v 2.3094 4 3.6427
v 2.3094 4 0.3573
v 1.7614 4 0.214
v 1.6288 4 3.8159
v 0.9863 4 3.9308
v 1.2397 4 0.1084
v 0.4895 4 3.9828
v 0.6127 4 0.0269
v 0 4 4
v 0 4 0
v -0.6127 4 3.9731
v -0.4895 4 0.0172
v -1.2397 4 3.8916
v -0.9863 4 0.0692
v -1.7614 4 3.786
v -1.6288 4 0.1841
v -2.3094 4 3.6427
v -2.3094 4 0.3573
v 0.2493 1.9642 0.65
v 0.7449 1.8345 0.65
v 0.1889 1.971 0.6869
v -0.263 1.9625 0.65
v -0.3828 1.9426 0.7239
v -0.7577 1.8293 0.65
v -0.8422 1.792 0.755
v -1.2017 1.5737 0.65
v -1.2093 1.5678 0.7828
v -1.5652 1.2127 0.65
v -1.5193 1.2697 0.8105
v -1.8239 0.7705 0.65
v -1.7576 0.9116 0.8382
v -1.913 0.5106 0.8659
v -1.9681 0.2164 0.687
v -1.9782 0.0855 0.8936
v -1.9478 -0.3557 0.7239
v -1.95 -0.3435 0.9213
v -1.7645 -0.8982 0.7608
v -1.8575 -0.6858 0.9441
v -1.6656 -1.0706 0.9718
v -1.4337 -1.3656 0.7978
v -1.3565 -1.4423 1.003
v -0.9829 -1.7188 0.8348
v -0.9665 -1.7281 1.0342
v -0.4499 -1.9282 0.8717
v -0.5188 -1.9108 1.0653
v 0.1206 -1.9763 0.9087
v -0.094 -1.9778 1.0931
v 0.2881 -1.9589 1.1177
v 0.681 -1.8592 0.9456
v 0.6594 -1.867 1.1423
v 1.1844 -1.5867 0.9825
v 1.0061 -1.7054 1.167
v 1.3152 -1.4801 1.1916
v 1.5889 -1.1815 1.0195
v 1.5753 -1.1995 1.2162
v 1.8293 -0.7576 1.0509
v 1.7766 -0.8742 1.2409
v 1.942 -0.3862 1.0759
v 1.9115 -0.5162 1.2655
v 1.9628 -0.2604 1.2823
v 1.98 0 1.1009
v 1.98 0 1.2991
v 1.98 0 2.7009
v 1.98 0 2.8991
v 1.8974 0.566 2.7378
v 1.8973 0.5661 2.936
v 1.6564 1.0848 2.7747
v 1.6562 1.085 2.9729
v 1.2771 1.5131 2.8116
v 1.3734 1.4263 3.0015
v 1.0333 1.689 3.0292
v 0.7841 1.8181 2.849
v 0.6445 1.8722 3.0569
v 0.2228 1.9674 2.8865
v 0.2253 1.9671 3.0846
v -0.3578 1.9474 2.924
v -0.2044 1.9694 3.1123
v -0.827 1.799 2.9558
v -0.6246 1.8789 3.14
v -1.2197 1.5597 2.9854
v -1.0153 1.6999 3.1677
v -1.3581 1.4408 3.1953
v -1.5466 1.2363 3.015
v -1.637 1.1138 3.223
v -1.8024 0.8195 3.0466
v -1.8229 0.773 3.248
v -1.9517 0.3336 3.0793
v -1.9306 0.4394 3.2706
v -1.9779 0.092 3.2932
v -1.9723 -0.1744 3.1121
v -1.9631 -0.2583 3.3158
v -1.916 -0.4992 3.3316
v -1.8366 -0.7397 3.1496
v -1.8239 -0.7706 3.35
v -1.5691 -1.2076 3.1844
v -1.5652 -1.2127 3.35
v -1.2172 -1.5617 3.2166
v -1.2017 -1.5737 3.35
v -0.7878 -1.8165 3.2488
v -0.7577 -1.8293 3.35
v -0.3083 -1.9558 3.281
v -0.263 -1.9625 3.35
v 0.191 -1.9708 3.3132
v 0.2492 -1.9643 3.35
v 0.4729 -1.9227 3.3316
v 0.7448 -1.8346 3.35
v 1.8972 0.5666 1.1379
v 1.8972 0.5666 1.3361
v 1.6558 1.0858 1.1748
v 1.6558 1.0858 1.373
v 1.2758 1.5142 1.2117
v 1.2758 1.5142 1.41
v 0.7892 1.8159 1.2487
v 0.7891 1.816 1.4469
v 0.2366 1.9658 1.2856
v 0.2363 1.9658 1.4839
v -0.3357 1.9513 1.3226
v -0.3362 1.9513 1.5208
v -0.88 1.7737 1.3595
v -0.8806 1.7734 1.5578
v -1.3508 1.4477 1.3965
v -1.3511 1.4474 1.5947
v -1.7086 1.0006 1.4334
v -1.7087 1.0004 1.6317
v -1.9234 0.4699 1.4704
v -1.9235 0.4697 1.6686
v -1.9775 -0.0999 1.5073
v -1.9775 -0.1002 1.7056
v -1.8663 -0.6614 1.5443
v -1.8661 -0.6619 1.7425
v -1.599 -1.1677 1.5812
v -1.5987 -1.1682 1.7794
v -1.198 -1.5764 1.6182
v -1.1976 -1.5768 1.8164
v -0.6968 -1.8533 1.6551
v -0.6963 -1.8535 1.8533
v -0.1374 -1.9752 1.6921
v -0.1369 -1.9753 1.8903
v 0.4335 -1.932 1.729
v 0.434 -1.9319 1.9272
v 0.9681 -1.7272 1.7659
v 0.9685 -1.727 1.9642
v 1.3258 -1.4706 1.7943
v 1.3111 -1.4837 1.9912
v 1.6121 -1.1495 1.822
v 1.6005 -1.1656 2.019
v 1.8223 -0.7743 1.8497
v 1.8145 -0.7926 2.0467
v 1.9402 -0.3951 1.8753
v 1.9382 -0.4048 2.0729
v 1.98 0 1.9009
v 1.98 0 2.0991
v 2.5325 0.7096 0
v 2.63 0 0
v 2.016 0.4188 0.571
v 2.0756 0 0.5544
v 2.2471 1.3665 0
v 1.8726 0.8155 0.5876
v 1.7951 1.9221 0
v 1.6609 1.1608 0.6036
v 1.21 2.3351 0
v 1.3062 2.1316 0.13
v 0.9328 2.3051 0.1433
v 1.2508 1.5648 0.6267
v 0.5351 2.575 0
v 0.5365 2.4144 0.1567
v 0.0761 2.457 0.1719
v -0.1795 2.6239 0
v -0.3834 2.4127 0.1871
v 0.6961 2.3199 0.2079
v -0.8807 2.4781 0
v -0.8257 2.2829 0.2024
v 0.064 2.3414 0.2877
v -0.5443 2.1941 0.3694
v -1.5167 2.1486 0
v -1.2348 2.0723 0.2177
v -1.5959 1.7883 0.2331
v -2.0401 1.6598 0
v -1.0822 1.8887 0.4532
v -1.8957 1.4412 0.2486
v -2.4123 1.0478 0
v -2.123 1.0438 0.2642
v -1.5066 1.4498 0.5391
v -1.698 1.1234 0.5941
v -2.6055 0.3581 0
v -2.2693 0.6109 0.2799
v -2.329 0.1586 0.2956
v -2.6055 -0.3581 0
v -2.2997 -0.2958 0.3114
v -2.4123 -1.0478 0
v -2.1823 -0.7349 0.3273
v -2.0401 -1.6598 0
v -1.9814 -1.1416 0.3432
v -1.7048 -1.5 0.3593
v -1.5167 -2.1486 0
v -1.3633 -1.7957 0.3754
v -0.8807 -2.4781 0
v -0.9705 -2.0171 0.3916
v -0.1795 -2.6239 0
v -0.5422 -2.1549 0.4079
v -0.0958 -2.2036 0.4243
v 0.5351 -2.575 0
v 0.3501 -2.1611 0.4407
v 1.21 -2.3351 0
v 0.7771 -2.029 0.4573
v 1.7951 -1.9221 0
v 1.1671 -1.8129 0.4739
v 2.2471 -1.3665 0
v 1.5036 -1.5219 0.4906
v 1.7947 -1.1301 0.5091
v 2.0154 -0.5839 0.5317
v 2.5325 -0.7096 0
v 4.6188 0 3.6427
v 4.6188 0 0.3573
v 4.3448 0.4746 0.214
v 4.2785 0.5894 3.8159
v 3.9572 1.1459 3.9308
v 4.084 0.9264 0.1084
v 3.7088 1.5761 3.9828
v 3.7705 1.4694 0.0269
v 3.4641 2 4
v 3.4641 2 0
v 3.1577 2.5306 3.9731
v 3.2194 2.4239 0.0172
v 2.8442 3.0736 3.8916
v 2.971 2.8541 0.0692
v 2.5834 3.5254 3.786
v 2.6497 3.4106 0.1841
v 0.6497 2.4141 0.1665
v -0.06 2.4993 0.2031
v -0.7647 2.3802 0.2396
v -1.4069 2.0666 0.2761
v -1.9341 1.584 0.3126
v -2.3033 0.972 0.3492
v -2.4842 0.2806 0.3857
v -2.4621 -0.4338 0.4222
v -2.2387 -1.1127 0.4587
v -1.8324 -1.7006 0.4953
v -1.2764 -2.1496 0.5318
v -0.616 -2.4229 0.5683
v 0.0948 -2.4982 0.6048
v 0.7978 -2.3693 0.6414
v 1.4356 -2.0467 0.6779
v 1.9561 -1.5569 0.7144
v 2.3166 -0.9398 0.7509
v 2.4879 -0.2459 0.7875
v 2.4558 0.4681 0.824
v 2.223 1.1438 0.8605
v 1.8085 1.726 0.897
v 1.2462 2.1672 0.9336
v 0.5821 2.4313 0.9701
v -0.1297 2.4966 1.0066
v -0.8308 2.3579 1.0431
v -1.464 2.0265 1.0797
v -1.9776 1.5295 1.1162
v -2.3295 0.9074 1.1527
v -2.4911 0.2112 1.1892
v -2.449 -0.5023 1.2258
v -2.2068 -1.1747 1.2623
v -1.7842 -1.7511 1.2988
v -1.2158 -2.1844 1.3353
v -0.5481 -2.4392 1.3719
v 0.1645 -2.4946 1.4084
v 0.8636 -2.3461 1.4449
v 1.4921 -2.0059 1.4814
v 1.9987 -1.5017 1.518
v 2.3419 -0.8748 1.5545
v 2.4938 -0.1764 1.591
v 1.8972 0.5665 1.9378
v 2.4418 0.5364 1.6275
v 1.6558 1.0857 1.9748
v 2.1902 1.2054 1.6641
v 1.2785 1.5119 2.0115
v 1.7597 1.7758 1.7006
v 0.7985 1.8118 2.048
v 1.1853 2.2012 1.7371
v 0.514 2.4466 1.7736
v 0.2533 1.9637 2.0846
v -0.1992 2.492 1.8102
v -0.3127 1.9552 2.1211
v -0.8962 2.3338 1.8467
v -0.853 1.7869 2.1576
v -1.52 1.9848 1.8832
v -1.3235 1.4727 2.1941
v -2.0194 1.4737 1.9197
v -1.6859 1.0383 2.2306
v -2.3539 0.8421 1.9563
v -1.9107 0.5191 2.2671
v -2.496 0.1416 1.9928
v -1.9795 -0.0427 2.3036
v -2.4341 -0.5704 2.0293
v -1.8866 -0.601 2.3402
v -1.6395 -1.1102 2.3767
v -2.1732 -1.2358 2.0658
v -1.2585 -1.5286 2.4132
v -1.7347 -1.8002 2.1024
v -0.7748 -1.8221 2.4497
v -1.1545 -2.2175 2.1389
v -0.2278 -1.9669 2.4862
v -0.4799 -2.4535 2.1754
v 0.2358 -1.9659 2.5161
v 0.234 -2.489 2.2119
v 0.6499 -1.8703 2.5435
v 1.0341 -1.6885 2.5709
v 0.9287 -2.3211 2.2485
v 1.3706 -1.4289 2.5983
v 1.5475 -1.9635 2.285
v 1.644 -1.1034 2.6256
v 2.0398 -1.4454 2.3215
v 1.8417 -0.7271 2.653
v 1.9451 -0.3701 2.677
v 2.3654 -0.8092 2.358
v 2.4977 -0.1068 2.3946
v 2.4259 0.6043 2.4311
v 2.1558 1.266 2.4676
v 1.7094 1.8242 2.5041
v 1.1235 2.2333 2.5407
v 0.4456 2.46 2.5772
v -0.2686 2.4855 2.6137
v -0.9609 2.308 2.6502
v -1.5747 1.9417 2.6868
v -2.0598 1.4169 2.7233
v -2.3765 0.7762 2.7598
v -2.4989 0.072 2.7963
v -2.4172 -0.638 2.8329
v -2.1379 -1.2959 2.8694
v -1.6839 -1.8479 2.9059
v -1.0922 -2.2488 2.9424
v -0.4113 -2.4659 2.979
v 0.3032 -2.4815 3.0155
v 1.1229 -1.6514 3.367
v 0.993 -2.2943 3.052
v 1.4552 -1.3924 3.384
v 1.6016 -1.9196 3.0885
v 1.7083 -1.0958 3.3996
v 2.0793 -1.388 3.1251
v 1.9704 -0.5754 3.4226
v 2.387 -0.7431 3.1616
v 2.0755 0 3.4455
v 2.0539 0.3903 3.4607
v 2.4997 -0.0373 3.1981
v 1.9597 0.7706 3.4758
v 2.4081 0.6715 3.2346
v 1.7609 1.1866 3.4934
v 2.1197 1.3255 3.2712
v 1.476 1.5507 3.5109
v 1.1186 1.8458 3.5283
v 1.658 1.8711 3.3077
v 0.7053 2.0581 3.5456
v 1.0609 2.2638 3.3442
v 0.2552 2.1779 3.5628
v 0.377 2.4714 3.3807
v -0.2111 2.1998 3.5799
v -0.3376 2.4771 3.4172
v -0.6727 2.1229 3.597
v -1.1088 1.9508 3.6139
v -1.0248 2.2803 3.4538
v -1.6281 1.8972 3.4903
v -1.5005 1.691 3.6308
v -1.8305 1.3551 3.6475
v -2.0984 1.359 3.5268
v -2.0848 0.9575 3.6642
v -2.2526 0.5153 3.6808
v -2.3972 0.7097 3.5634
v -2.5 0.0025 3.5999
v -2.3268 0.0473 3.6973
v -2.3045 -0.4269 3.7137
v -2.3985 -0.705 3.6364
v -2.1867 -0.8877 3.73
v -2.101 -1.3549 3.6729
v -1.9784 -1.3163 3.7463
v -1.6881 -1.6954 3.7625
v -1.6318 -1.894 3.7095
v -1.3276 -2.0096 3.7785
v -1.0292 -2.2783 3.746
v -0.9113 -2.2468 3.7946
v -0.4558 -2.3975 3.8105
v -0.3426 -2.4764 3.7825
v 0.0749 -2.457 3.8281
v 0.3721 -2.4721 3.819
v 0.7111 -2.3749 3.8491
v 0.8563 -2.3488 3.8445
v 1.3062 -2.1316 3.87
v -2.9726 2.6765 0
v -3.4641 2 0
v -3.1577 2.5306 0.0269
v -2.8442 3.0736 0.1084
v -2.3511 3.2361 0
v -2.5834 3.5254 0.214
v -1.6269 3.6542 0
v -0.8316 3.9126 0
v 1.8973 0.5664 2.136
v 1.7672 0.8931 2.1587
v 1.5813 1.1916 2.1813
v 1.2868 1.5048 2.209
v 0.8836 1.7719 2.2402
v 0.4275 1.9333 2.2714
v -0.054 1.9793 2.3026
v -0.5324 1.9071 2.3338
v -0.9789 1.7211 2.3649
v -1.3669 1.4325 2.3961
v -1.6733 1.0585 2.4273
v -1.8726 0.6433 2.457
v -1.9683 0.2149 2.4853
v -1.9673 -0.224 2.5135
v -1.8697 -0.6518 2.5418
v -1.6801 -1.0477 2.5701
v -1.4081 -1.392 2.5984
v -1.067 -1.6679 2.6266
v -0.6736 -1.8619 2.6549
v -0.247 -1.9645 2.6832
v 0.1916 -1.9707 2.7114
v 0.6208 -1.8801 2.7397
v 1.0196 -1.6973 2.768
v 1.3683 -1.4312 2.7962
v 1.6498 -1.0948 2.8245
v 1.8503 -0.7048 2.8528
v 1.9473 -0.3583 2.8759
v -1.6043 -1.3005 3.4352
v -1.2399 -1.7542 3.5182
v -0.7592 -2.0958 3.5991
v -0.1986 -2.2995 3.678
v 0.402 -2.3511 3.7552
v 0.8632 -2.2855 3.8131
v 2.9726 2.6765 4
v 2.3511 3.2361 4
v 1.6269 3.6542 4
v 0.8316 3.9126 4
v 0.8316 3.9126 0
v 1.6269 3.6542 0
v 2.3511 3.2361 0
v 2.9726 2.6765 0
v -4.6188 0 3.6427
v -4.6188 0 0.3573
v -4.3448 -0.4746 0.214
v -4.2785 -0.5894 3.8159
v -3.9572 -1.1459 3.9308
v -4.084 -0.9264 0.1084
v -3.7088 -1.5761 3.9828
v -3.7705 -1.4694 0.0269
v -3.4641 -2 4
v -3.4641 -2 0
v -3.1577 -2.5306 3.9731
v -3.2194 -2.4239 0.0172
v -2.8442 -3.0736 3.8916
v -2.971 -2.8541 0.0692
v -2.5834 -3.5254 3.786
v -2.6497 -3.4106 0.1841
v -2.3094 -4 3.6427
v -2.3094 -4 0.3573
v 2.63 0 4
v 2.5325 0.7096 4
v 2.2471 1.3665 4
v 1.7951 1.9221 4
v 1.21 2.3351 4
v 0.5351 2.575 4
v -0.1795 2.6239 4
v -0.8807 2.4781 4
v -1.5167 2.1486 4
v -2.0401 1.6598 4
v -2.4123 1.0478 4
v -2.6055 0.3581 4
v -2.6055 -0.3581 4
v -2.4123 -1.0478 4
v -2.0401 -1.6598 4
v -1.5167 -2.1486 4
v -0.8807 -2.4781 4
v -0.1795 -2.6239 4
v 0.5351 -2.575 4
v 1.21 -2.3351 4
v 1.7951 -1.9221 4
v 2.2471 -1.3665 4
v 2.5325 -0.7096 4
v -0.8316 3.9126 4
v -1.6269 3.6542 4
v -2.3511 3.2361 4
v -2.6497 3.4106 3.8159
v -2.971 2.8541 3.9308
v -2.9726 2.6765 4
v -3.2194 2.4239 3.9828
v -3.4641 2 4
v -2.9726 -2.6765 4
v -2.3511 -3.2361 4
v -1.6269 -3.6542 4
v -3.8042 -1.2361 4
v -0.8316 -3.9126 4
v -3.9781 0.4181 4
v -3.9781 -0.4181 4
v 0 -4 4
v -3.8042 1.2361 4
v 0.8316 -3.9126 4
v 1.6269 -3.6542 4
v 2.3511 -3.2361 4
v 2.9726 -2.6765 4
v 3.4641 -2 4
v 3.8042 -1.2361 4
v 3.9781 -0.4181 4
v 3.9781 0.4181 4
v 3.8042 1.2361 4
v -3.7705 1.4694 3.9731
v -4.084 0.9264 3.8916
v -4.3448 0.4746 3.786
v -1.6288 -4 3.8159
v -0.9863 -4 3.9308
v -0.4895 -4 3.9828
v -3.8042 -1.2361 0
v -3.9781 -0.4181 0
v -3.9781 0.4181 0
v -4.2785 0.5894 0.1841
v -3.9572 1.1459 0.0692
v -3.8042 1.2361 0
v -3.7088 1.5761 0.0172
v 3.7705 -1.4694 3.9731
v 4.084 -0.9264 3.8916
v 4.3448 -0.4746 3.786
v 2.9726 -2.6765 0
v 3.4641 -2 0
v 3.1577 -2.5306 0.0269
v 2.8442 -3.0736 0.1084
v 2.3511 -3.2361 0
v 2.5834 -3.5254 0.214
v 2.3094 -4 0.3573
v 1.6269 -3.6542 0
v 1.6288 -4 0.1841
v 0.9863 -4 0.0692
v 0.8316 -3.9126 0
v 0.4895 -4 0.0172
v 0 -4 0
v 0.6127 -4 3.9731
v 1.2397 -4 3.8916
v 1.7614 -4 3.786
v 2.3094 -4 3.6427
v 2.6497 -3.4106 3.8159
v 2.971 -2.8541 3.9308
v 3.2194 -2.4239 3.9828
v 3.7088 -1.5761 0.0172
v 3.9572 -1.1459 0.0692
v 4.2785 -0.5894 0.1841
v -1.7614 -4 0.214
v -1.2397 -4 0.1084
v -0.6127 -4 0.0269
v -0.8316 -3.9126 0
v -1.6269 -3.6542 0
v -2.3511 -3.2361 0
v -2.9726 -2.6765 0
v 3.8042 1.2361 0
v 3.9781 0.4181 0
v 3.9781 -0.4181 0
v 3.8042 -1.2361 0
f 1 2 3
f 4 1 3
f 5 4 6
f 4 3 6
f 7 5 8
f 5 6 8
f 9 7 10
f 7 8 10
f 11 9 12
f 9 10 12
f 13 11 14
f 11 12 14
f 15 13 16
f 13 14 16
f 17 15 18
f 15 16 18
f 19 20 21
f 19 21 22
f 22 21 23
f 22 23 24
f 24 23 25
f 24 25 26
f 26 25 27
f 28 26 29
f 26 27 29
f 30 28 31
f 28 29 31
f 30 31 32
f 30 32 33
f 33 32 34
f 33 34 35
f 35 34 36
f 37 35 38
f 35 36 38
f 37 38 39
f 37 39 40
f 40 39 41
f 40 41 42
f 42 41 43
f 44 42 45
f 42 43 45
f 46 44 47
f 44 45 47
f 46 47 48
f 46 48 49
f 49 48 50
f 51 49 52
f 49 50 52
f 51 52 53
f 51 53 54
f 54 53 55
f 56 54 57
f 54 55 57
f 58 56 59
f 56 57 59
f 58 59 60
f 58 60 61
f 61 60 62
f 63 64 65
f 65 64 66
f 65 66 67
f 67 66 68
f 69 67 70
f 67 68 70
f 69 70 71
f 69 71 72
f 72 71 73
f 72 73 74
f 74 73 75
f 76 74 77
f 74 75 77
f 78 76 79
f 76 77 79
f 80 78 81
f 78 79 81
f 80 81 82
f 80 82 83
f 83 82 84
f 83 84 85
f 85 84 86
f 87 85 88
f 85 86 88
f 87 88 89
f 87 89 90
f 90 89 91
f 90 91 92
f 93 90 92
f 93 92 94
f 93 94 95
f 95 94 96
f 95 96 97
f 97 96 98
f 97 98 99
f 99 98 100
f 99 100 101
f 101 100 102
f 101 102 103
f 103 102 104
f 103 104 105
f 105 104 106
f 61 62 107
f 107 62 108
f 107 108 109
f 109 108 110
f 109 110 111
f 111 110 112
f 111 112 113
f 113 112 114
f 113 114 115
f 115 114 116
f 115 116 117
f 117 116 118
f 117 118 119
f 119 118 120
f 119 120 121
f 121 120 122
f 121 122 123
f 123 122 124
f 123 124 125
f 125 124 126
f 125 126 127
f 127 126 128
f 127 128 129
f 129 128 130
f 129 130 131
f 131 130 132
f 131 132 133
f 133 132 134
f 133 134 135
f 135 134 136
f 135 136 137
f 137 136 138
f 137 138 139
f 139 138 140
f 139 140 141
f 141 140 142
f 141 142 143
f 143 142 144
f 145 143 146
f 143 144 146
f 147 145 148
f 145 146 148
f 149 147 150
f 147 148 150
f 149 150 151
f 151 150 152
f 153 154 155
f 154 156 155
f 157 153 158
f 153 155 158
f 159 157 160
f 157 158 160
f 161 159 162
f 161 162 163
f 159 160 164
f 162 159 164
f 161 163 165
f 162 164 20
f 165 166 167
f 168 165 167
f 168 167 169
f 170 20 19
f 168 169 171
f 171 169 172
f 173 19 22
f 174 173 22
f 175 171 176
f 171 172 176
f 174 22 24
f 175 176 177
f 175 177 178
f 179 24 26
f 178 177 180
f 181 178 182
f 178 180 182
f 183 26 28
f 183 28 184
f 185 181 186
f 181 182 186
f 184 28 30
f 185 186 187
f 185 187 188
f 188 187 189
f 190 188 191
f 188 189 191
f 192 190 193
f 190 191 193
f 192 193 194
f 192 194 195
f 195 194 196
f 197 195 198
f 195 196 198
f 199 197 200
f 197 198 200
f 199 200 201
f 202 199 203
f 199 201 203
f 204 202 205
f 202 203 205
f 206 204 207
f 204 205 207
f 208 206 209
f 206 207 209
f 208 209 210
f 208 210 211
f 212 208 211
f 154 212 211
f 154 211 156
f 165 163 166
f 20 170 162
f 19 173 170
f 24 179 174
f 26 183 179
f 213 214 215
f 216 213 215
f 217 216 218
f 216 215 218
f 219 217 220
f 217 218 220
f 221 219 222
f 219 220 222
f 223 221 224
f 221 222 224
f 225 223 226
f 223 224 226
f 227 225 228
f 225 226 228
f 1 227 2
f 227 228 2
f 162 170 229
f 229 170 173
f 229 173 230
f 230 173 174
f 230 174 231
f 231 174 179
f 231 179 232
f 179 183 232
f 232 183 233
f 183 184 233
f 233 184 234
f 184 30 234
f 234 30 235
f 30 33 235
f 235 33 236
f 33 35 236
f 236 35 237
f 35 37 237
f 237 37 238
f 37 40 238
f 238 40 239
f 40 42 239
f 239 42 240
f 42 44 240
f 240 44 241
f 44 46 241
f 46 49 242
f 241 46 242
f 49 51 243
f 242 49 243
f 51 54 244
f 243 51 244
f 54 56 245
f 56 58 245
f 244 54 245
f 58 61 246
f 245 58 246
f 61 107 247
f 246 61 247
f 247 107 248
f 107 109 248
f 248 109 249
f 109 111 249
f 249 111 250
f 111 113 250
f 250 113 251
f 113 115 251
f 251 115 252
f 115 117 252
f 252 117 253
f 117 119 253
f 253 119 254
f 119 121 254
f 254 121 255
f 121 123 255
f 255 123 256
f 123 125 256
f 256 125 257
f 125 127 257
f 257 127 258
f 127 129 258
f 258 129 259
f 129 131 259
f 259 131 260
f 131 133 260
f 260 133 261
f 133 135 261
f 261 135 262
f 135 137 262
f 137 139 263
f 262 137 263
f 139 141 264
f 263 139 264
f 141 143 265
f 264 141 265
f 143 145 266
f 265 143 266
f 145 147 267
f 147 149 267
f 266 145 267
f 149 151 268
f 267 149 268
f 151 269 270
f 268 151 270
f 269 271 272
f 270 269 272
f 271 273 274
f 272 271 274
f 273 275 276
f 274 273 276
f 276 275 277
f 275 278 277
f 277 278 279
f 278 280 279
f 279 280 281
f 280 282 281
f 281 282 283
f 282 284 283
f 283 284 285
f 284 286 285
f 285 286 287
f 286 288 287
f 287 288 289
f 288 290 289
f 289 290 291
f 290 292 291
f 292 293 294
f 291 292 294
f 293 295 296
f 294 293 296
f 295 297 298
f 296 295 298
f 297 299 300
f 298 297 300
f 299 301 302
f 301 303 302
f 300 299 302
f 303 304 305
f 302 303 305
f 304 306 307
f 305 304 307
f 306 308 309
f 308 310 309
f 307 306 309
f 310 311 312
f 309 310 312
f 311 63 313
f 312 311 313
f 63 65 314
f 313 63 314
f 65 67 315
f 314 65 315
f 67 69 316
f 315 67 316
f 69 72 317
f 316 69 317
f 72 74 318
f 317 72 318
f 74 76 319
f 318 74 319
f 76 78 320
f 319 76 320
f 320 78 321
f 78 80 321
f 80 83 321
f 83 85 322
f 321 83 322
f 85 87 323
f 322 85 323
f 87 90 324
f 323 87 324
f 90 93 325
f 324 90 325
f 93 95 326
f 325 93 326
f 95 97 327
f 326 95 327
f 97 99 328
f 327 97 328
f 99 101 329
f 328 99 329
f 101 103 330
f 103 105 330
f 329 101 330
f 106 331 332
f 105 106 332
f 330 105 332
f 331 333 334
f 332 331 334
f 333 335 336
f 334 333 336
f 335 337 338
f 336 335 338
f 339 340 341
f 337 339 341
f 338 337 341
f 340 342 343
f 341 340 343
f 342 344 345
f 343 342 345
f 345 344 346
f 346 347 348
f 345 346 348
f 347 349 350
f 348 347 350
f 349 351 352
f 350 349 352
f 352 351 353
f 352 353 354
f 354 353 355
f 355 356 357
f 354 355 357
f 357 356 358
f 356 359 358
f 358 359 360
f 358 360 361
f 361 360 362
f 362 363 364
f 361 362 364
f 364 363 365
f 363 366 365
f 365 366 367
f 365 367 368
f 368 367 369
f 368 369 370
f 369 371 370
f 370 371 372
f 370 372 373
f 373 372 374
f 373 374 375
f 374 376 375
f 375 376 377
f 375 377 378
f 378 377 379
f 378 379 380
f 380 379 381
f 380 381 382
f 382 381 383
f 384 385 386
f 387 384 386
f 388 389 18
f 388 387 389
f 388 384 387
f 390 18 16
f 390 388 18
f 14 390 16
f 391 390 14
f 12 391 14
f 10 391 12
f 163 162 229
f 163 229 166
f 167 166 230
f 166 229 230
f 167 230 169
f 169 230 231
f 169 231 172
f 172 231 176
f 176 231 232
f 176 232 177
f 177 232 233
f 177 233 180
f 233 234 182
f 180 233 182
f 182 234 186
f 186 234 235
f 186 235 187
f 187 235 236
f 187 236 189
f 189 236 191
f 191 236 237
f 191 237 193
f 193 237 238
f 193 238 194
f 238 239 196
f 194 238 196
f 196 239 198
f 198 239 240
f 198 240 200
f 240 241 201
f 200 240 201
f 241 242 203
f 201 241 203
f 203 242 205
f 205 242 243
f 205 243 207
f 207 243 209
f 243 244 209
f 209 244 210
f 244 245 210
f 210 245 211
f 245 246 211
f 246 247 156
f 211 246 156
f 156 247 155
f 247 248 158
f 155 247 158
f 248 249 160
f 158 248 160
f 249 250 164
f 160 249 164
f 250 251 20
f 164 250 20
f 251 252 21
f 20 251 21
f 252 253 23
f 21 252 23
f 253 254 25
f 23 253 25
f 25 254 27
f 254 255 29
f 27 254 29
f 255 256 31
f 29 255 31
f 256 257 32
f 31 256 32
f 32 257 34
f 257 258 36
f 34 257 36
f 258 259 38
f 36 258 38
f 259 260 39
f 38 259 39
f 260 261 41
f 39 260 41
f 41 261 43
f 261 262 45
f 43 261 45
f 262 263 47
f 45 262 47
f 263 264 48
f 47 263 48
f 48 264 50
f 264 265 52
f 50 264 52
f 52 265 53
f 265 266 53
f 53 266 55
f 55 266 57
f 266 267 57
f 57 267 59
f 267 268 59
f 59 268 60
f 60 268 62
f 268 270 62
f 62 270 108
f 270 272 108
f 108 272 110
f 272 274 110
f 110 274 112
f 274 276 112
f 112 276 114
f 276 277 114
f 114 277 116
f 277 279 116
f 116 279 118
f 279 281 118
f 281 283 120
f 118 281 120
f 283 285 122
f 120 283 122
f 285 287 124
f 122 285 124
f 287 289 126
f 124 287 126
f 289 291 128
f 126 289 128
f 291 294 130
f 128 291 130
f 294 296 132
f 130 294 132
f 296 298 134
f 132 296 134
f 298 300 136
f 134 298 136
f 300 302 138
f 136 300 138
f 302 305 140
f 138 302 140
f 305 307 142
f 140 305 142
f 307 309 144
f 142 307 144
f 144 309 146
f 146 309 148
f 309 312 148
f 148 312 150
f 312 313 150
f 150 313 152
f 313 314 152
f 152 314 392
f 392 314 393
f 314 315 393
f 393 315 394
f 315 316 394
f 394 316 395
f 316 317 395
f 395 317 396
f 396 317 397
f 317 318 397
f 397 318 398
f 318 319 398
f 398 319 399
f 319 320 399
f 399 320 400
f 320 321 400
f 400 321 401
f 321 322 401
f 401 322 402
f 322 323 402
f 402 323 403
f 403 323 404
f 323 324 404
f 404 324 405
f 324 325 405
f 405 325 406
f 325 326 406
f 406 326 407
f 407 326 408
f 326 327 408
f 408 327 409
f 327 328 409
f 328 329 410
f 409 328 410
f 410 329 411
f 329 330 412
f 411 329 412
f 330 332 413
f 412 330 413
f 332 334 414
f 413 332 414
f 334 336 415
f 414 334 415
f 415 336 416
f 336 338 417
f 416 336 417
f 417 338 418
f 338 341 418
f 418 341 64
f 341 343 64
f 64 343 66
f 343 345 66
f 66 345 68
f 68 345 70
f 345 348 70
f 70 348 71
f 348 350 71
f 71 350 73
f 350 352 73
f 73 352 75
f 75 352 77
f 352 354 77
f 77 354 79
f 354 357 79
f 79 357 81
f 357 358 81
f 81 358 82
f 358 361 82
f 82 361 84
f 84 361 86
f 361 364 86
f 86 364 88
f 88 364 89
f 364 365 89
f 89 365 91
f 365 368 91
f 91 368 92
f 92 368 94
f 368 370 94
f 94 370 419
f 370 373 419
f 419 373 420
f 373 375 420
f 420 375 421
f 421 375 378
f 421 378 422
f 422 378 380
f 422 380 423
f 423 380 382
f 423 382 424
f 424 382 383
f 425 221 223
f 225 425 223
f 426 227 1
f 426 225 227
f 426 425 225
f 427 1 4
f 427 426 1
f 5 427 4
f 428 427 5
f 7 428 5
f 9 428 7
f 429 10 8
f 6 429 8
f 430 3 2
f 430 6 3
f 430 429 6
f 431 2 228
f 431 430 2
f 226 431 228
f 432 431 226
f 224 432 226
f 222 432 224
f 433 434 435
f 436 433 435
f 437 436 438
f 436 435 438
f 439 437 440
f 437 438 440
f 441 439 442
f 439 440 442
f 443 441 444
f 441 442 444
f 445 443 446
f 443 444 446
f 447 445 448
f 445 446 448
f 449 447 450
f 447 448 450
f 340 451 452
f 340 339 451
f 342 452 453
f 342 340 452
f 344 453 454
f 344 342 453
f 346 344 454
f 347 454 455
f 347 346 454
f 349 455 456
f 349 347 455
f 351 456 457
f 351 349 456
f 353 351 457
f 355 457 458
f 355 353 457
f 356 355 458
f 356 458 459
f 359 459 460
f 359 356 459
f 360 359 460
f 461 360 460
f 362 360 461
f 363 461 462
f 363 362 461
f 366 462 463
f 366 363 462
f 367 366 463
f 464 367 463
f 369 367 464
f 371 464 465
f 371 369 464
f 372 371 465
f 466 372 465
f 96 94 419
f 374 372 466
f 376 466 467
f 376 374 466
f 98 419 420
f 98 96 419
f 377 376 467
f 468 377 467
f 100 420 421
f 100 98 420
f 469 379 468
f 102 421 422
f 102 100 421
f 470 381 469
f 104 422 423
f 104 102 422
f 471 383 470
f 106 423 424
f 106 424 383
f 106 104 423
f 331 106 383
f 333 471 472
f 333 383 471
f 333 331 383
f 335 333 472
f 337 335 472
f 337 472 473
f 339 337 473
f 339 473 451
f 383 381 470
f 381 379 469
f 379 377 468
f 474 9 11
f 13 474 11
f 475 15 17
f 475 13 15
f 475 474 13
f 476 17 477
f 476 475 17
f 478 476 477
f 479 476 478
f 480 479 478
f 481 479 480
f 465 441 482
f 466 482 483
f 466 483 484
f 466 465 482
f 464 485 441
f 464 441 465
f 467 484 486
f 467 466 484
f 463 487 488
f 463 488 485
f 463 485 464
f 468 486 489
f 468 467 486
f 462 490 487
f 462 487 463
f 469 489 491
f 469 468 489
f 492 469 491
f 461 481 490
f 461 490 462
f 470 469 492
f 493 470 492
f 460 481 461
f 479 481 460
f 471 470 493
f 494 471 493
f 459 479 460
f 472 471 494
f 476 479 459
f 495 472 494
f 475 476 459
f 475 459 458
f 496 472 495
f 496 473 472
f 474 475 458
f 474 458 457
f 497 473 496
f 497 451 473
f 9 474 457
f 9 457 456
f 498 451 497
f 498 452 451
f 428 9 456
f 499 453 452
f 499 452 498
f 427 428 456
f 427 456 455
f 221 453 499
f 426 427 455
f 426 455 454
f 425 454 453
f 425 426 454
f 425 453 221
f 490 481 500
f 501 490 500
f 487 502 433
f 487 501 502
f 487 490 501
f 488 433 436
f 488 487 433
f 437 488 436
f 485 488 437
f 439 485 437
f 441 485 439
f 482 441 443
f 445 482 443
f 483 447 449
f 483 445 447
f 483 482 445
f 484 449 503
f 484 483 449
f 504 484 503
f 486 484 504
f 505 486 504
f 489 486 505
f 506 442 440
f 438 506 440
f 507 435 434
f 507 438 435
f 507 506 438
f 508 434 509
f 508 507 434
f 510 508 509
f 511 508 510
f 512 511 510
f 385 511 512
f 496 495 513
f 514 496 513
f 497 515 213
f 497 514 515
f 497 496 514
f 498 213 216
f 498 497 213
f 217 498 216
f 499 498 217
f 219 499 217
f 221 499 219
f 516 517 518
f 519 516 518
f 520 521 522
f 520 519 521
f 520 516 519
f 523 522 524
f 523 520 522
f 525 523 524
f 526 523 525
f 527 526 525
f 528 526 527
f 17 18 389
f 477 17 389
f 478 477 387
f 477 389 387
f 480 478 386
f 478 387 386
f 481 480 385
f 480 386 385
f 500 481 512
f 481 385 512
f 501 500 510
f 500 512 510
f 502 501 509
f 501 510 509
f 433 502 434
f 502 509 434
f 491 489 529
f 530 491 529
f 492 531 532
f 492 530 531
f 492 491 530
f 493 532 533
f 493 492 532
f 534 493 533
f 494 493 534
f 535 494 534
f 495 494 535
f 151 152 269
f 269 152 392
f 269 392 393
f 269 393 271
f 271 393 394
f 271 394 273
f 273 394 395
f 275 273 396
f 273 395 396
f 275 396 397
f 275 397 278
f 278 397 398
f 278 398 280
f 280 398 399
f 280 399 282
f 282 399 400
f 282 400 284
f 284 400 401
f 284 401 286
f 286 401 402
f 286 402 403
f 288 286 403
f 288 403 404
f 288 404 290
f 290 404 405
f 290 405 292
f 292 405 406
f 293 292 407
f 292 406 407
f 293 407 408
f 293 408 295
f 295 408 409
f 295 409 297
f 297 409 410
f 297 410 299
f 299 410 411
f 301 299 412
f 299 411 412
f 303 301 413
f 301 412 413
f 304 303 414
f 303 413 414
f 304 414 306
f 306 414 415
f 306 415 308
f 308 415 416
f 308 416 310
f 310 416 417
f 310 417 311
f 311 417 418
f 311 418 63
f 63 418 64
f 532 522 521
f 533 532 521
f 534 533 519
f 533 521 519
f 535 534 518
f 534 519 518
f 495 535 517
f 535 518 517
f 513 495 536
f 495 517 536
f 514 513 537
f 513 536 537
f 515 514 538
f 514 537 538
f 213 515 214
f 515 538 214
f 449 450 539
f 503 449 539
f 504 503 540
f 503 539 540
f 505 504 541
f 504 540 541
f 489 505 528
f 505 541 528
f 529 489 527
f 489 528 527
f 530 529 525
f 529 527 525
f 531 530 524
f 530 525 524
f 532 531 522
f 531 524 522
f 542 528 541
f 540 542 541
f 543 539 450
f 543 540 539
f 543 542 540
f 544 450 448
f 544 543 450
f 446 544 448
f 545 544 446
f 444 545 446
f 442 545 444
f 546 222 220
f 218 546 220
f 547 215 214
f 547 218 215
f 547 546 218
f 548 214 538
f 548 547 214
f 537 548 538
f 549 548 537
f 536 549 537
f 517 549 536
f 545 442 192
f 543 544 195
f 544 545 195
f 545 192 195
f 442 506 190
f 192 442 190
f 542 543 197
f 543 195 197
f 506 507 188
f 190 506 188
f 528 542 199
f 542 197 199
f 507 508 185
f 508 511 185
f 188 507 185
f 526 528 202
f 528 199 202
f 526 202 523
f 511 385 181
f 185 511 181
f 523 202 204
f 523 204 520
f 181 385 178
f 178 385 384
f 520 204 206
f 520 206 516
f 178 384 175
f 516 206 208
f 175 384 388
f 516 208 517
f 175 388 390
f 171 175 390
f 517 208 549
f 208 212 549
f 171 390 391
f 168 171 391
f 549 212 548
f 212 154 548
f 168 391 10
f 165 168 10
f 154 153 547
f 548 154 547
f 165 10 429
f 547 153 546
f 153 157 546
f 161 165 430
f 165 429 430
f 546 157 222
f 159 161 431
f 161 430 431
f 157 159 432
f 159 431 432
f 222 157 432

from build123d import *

# Parameters (mm, degrees)
Y_KSEKLIK_EKSTR_ZYON1_DEPTH = 4
IZIM2_OUTSIDE_W             = 27.666
IZIM2_OUTSIDE_H             = 26.428
IZIM2_OUTSIDE_R             = 4
KES_EKSTR_ZYON1_DEPTH       = 4
KES_EKSTR_ZYON1_DRAFT       = -60
IZIM3_OUTSIDE_W             = 27.666
IZIM3_OUTSIDE_H             = 26.428
IZIM3_OUTSIDE_R             = 4
KES_EKSTR_ZYON2_DEPTH       = 4
KES_EKSTR_ZYON2_DRAFT       = -60
IZIM4_R                     = 1.98
KES_EKSTR_ZYON3_DEPTH       = 4
PAH1_SIZE                   = 0.65
KES_S_P_R1_PITCH            = 0.8
KES_S_P_R1_HEIGHT           = 5
KES_S_P_R1_RADIUS           = 1.98


with BuildPart() as part:
    # Çizim1 → Yükseklik-Ekstrüzyon1 (new body)
    with BuildSketch(Plane.XY):
        Polygon((4.618802154, 0), (2.309401077, 4), (-2.309401077, 4), (-4.618802154, 0), (-2.309401077, -4), (2.309401077, -4), align=None)
    extrude(amount=Y_KSEKLIK_EKSTR_ZYON1_DEPTH)


with BuildPart() as kes_ekstr_zyon1_tool:
    # Çizim2 outside → Kes-Ekstrüzyon1 (with draft: the straight prism first)
    with BuildSketch(Plane.XY.offset(4)):
        Rectangle(IZIM2_OUTSIDE_W, IZIM2_OUTSIDE_H)
        Circle(IZIM2_OUTSIDE_R, mode=Mode.SUBTRACT)
    extrude(amount=-KES_EKSTR_ZYON1_DEPTH)
    # Kes-Ekstrüzyon1: the draft: its side faces are tilted about the plane it starts from
    kes_ekstr_zyon1_sides = [kes_ekstr_zyon1_tool.faces().sort_by_distance(p)[0] for p in [
        (0, -13.214, 2),
        (13.833, 0, 2),
        (0, 13.214, 2),
        (-13.833, 0, 2),
        (-4, 0, 2),
    ]]
    draft(kes_ekstr_zyon1_sides, Plane.XY.offset(4), KES_EKSTR_ZYON1_DRAFT)


with BuildPart() as part_1:
    add(part.part)

    # Kes-Ekstrüzyon1: cut by kes_ekstr_zyon1_tool
    add(kes_ekstr_zyon1_tool.part, mode=Mode.SUBTRACT)


with BuildPart() as kes_ekstr_zyon2_tool:
    # Çizim3 outside → Kes-Ekstrüzyon2 (with draft: the straight prism first)
    with BuildSketch(Plane(origin=(0, 0, 0), x_dir=(-1, 0, 0), z_dir=(0, 0, -1))):
        Rectangle(IZIM3_OUTSIDE_W, IZIM3_OUTSIDE_H)
        Circle(IZIM3_OUTSIDE_R, mode=Mode.SUBTRACT)
    extrude(amount=-KES_EKSTR_ZYON2_DEPTH)
    # Kes-Ekstrüzyon2: the draft: its side faces are tilted about the plane it starts from
    kes_ekstr_zyon2_sides = [kes_ekstr_zyon2_tool.faces().sort_by_distance(p)[0] for p in [
        (0, -13.214, 2),
        (-13.833, 0, 2),
        (0, 13.214, 2),
        (13.833, 0, 2),
        (4, 0, 2),
    ]]
    draft(kes_ekstr_zyon2_sides, Plane(origin=(0, 0, 0), x_dir=(-1, 0, 0), z_dir=(0, 0, -1)), KES_EKSTR_ZYON2_DRAFT)


with BuildPart() as part_2:
    add(part_1.part)

    # Kes-Ekstrüzyon2: cut by kes_ekstr_zyon2_tool
    add(kes_ekstr_zyon2_tool.part, mode=Mode.SUBTRACT)

    # Çizim4 → Kes-Ekstrüzyon3 (cut)
    with BuildSketch(Plane.XY.offset(4)):
        Circle(IZIM4_R)
    extrude(amount=-KES_EKSTR_ZYON3_DEPTH, mode=Mode.SUBTRACT)

    # Pah1
    pah1_edges = [part_2.edges().sort_by_distance(p)[0] for p in [
        (-1.98, 0, 0),
        (-1.98, 0, 4),
    ]]
    chamfer(pah1_edges, length=PAH1_SIZE)

    # Kes-Süpür1: sweep along a helix
    with BuildLine() as kes_s_p_r1_path:
        Helix(KES_S_P_R1_PITCH, KES_S_P_R1_HEIGHT, KES_S_P_R1_RADIUS, center=(0, 0, 0), direction=(0, 0, 1))
    # Çizim6 → Kes-Süpür1 (sweep, cut)
    with BuildSketch(Plane(origin=(0, 1.98, 5), x_dir=(0.06417248340128018, 5.079204879135305e-15, 0.9979388219595992), z_dir=(-0.9979388219595992, -7.898612403512853e-14, 0.06417248340128018))):
        Polygon((0, 0.52), (-0.383328785, -0.143944932), (0.383328785, -0.143944932), align=None)
    sweep(path=kes_s_p_r1_path.line, is_frenet=True, mode=Mode.SUBTRACT)


solid = part_2.part
